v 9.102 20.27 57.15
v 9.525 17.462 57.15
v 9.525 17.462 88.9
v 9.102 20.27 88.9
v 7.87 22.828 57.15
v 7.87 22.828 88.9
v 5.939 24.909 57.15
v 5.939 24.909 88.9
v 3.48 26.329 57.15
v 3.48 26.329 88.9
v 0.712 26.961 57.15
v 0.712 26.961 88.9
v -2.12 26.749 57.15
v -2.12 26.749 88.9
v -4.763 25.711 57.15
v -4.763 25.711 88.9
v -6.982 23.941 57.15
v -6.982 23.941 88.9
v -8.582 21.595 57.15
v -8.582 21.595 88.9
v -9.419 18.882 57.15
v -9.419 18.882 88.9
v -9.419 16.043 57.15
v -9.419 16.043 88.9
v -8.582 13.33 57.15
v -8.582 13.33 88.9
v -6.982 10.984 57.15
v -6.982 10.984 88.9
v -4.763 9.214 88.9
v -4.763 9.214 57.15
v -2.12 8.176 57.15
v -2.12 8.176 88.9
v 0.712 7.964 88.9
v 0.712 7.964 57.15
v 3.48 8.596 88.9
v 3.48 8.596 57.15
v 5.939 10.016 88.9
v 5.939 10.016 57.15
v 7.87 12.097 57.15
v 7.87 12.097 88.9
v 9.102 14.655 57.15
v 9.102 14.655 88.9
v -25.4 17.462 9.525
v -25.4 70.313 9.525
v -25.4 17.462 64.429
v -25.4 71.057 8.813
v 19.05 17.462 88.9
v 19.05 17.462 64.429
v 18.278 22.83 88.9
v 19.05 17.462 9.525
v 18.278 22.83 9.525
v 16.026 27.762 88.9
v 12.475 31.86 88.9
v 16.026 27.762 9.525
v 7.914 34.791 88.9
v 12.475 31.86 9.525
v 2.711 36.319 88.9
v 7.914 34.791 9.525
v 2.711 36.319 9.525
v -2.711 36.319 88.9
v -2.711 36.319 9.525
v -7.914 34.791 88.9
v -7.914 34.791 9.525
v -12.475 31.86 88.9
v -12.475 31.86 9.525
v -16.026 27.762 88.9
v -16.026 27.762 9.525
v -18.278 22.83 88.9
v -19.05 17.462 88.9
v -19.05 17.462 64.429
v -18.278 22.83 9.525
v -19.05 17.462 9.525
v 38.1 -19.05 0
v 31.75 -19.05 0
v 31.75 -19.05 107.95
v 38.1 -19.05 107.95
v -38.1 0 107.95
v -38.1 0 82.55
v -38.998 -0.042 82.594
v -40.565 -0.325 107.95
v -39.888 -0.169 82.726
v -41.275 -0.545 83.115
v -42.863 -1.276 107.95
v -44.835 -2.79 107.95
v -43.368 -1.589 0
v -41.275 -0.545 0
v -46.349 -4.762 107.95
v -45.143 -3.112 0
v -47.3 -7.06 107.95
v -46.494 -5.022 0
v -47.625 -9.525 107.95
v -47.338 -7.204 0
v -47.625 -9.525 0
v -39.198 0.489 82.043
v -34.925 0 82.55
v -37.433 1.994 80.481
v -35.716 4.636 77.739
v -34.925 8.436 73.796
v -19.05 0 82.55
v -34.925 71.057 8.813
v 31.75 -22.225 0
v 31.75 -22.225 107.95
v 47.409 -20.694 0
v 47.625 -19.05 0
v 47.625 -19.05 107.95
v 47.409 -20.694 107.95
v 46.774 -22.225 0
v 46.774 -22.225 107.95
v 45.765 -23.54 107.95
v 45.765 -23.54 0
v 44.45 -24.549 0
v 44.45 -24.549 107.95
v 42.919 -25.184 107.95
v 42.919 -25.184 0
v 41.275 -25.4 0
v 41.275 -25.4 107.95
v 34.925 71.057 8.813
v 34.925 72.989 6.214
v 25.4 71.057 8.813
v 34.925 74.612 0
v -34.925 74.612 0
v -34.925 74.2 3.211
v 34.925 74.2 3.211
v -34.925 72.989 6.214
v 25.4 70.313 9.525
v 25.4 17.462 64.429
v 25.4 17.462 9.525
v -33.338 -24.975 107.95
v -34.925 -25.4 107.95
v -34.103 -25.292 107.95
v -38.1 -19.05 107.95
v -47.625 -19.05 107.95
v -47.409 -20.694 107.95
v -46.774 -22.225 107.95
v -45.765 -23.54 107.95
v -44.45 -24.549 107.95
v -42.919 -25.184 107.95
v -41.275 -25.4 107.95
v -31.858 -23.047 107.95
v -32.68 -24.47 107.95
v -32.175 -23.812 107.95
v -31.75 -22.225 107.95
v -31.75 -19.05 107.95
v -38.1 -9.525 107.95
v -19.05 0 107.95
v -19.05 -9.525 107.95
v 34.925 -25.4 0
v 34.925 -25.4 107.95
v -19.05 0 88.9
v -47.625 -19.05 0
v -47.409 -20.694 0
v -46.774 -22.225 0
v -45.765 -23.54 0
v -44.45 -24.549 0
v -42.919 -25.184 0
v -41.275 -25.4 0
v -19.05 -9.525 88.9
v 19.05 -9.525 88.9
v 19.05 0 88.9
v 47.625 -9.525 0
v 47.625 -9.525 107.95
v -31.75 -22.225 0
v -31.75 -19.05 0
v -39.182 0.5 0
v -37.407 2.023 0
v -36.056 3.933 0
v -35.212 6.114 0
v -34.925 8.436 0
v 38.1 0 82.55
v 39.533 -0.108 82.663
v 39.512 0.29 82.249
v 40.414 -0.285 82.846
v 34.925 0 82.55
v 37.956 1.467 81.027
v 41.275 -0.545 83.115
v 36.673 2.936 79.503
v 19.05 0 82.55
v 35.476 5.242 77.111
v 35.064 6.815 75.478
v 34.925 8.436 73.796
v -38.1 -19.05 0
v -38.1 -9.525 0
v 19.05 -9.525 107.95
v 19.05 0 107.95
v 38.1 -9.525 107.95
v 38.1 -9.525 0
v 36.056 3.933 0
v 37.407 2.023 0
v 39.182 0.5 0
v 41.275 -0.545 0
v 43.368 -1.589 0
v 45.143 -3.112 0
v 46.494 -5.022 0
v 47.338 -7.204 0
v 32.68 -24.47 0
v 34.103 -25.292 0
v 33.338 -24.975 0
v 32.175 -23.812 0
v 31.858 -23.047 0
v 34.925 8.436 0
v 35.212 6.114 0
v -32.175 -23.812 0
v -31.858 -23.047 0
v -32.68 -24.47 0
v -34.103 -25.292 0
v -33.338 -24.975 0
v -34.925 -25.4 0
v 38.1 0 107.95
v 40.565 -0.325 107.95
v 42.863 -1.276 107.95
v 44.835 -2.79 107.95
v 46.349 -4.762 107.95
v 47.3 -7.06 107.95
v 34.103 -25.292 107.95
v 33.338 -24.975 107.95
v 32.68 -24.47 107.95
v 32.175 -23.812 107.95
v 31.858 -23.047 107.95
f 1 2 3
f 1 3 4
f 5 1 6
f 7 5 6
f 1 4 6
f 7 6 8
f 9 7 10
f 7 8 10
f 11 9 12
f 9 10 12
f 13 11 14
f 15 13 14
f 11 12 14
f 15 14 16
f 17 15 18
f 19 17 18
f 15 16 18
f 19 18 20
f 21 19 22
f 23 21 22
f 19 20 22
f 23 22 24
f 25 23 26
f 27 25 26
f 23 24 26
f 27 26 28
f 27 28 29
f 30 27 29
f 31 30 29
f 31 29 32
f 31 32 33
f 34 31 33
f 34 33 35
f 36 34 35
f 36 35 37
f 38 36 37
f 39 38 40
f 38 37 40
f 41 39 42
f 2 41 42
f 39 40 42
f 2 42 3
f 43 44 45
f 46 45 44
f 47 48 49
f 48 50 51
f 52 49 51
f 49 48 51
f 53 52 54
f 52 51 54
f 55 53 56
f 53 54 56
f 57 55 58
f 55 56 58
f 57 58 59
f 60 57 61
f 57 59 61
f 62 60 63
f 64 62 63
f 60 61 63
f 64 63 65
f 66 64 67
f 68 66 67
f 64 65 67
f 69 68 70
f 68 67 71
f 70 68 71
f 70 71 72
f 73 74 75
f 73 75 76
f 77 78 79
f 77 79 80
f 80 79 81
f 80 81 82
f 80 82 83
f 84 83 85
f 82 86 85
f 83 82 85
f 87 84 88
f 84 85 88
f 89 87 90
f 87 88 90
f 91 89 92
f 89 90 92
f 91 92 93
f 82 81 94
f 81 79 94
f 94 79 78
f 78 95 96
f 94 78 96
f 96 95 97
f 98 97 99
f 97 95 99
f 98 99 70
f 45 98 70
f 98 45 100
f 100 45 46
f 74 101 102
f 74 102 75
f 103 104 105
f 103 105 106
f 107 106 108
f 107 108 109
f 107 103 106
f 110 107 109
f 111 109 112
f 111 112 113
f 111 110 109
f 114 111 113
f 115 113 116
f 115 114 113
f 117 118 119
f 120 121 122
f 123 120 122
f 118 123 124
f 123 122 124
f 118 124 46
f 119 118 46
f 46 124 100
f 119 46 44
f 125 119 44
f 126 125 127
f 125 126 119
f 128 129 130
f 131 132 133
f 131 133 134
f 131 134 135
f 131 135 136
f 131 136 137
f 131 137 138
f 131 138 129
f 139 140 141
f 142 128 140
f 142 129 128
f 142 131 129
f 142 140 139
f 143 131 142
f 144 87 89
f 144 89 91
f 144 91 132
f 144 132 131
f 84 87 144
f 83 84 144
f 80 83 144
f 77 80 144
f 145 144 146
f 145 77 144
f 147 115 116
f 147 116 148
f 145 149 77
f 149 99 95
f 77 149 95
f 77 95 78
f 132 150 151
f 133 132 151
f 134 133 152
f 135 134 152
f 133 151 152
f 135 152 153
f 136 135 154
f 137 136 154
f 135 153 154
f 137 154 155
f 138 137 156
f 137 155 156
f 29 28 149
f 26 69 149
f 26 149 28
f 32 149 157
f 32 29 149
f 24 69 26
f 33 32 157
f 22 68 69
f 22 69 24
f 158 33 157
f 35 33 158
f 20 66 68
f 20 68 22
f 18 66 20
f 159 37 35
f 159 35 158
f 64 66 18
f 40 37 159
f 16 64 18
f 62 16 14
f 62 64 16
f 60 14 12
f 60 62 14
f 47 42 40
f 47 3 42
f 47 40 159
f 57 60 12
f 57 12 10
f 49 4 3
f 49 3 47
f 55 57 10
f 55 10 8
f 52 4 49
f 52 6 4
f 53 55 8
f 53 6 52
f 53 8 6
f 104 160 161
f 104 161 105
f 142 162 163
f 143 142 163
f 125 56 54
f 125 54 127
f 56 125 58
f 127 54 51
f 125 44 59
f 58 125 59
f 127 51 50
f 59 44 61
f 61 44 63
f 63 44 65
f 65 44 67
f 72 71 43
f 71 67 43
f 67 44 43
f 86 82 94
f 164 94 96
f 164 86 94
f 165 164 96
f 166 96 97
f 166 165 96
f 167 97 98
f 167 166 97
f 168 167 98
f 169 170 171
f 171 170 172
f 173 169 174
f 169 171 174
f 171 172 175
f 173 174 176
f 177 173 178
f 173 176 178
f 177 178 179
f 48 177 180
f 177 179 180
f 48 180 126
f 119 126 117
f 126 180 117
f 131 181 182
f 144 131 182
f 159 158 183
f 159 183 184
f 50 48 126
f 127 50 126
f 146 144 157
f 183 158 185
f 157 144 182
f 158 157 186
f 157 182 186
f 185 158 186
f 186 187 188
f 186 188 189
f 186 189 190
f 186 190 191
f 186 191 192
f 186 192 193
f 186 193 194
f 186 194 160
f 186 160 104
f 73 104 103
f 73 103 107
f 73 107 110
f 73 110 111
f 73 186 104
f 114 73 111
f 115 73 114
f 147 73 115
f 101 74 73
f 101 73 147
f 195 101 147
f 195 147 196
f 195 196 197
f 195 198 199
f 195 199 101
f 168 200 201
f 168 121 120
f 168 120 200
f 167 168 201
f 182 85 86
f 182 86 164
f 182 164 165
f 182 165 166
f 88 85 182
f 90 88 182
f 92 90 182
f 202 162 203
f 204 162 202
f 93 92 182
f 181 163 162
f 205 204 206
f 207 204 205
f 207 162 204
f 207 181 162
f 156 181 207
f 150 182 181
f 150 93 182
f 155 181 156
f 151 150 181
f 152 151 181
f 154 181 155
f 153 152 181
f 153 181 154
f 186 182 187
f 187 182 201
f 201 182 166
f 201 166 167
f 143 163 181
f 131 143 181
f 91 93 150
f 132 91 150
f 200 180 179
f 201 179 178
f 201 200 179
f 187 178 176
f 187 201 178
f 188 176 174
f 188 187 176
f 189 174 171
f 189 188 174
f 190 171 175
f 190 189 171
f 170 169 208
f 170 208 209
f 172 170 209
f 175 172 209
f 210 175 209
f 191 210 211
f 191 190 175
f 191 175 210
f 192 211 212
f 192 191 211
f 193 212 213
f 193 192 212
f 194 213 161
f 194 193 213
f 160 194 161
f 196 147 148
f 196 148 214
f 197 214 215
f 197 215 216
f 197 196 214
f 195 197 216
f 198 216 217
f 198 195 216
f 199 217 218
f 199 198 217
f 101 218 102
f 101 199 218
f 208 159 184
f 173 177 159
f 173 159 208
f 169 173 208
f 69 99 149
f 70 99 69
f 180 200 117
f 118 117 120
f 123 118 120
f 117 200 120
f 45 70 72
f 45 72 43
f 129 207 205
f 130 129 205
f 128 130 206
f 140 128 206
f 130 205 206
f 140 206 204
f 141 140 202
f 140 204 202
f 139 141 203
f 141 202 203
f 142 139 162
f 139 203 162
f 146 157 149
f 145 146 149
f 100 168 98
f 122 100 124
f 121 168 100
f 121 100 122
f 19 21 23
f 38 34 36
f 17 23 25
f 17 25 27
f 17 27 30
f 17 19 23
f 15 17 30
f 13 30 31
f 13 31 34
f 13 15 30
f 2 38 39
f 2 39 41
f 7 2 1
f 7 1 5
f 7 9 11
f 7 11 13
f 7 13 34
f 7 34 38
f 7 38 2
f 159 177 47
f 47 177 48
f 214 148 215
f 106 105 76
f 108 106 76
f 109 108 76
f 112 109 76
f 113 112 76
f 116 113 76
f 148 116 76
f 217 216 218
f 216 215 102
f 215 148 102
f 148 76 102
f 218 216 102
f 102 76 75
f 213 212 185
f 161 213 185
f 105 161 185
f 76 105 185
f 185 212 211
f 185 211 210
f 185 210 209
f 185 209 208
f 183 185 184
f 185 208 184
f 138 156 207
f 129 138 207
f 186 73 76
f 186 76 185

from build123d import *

# Parameters (mm, degrees)
BOSS_EXTRUDE1_DEPTH   = 107.95
BOSS_EXTRUDE1_2_DEPTH = 107.95
SKETCH1_6_W           = 6.35
SKETCH1_6_H           = 17.4625
BOSS_EXTRUDE2_DEPTH   = 82.55
CUT_EXTRUDE2_REACH    = 157.031
BOSS_EXTRUDE4_DEPTH   = 88.9
BOSS_EXTRUDE6_REACH   = 152.176
SKETCH5_R             = 9.525
CUT_EXTRUDE3_DEPTH    = 31.75
FILLET2_R             = 9.525


with BuildPart() as part:
    # Sketch1 → Boss-Extrude1 (new body)
    with BuildSketch(Plane.XY):
        with BuildLine():
            ThreePointArc((34.925, -25.4), (32.67993597, -24.47006403), (31.75, -22.225))
            Line((31.75, -22.225), (31.75, -19.05))
            Line((31.75, -19.05), (38.1, -19.05))
            Line((38.1, -19.05), (38.1, -9.525))
            Line((38.1, -9.525), (19.05, -9.525))
            Line((19.05, -9.525), (19.05, 0))
            Line((19.05, 0), (38.1, 0))
            ThreePointArc((38.1, 0), (44.835192091, -2.789807909), (47.625, -9.525))
            Line((47.625, -9.525), (47.625, -19.05))
            ThreePointArc((47.625, -19.05), (45.765128061, -23.540128061), (41.275, -25.4))
            Line((41.275, -25.4), (34.925, -25.4))
        make_face()
    extrude(amount=BOSS_EXTRUDE1_DEPTH)

    # Sketch1<6> → Boss-Extrude2 (add)
    with BuildSketch(Plane.XY):
        with Locations((22.225, 8.73125)):
            Rectangle(SKETCH1_6_W, SKETCH1_6_H)
        Polygon((25.4, 17.4625), (25.4, 0), (34.925, 0), (34.925, 74.6125), (25.4, 74.6125), align=None)
    boss_extrude2 = extrude(amount=BOSS_EXTRUDE2_DEPTH)

    # Cut-Extrude2: up to this face of the body (flat: up to its plane)
    cut_extrude2_end = Plane(part.part.faces().sort_by_distance((19.05, 3.113443878, 46.562346939))[0])
    # Sketch3 → Cut-Extrude2 (cut, up to the picked face)
    with BuildSketch(Plane(origin=(34.925, 0, 0), x_dir=(0, 0, -1), z_dir=(1, 0, 0)), mode=Mode.PRIVATE) as cut_extrude2_sk1:
        with BuildLine():
            Line((-82.55, 0), (-8.812527697, 71.057408725))
            ThreePointArc((-8.812527697, 71.057408725), (-4.751297675, 73.690240462), (0, 74.6125))
            Line((0, 74.6125), (-82.55, 74.6125))
            Line((-82.55, 74.6125), (-82.55, 0))
        make_face()
    cut_extrude2_tool1 = split(extrude(cut_extrude2_sk1.sketch, amount=-CUT_EXTRUDE2_REACH, mode=Mode.PRIVATE), bisect_by=cut_extrude2_end, keep=Keep.BOTH, mode=Mode.PRIVATE)
    cut_extrude2 = cut_extrude2_tool1.solids().sort_by(Axis((34.925, 49.768554, 56.6833), (-1, 0, 0)))[0]
    add(cut_extrude2, mode=Mode.SUBTRACT)



with BuildPart() as body_2:
    # Sketch1 → Boss-Extrude1 2 (new body)
    with BuildSketch(Plane.XY):
        with BuildLine():
            Line((-38.1, -9.525), (-19.05, -9.525))
            Line((-19.05, -9.525), (-19.05, 0))
            Line((-19.05, 0), (-25.4, 0))
            Line((-25.4, 0), (-34.925, 0))
            Line((-34.925, 0), (-38.1, 0))
            ThreePointArc((-38.1, 0), (-44.835192091, -2.789807909), (-47.625, -9.525))
            Line((-47.625, -9.525), (-47.625, -19.05))
            ThreePointArc((-47.625, -19.05), (-45.765128061, -23.540128061), (-41.275, -25.4))
            Line((-41.275, -25.4), (-34.925, -25.4))
            ThreePointArc((-34.925, -25.4), (-32.67993597, -24.47006403), (-31.75, -22.225))
            Line((-31.75, -22.225), (-31.75, -19.05))
            Line((-31.75, -19.05), (-38.1, -19.05))
            Line((-38.1, -19.05), (-38.1, -9.525))
        make_face()
    extrude(amount=BOSS_EXTRUDE1_2_DEPTH)


with BuildPart() as part_1:
    add(part.part)

    add(body_2.part)  # Boss-Extrude4 merges body 2
    # Sketch1<8> → Boss-Extrude4 (add)
    with BuildSketch(Plane.XY):
        with BuildLine():
            Line((19.05, -9.525), (19.05, 0))
            Line((19.05, 0), (19.05, 17.4625))
            ThreePointArc((19.05, 17.4625), (0, 36.5125), (-19.05, 17.4625))
            Line((-19.05, 17.4625), (-19.05, 0))
            Line((-19.05, 0), (-19.05, -9.525))
            Line((-19.05, -9.525), (19.05, -9.525))
        make_face()
    extrude(amount=BOSS_EXTRUDE4_DEPTH)

    # Mirror1: Boss-Extrude2, Cut-Extrude2 across plane
    add(boss_extrude2.mirror(Plane(origin=(0, 0, 0), x_dir=(0, 0, 1), z_dir=(1, 0, 0))))
    add(cut_extrude2.mirror(Plane(origin=(0, 0, 0), x_dir=(0, 0, 1), z_dir=(1, 0, 0))), mode=Mode.SUBTRACT)

    # Boss-Extrude6: up to this face of the body (flat: up to its plane)
    boss_extrude6_end = Plane(part_1.part.faces().sort_by_distance((25.4, 37.857380573, 21.629312561))[0])
    # Sketch4 → Boss-Extrude6 (add, up to the picked face)
    with BuildSketch(Plane(origin=(-25.4, 0, 0), x_dir=(0, 0, -1), z_dir=(1, 0, 0)), mode=Mode.PRIVATE) as boss_extrude6_sk1:
        with BuildLine():
            Line((0, 17.4625), (0, 74.6125))
            ThreePointArc((0, 74.6125), (-4.751297675, 73.690240462), (-8.812527697, 71.057408725))
            Line((-8.812527697, 71.057408725), (-9.525, 70.312760413))
            Line((-9.525, 70.312760413), (-9.525, 17.4625))
            Line((-9.525, 17.4625), (0, 17.4625))
        make_face()
    boss_extrude6_tool1 = split(extrude(boss_extrude6_sk1.sketch, amount=BOSS_EXTRUDE6_REACH, mode=Mode.PRIVATE), bisect_by=boss_extrude6_end, keep=Keep.BOTH, mode=Mode.PRIVATE)
    add(boss_extrude6_tool1.solids().sort_by(Axis((-25.4, 45.391099, 4.704073), (1, 0, 0)))[0])

    # Sketch5 → Cut-Extrude3 (cut)
    with BuildSketch(Plane.XY.offset(88.9)):
        with Locations((0, 17.4625)):
            Circle(SKETCH5_R)
    extrude(amount=-CUT_EXTRUDE3_DEPTH, mode=Mode.SUBTRACT)

    # Fillet2
    # the kernel refuses this fillet: 9.525 mm, written as the material it adds along each edge
    with BuildSketch(Plane(origin=(-34.925, 0, 0), x_dir=(-0.9963405296085165, -0.08547250469841781, 0), z_dir=(0, 0, 1))) as fillet2_piece_1_section:
        with BuildLine():
            CenterArc((8.769139185, -9.218768342), FILLET2_R, 104.568024357, 70.528779366)
            Line((-0.72100436, -8.404642735), (-1.670018714, -8.323230174))
            Line((-1.670018714, -8.323230174), (-0.949014354, 0.081412561))
            Line((-0.949014354, 0.081412561), (0.081412561, 0.949014354))
            ThreePointArc((0.081412561, 0.949014354), (3.244793742, 0.677639152), (6.133741367, 0.921876834))
            Line((6.133741367, 0.921876834), (6.373322987, 0))
        make_face()
    fillet2_piece_1 = extrude(amount=103.638780605, mode=Mode.PRIVATE)
    fillet2_piece_1 = split(fillet2_piece_1, bisect_by=Plane(origin=(-36.202557182, 22.072398362, 59.645099694), z_dir=(0, -0.7200715531259144, -0.6938998186905898)), keep=Keep.TOP, mode=Mode.PRIVATE)
    add(fillet2_piece_1)
    with BuildSketch(Plane(origin=(34.925, 0, 0), x_dir=(0, 1, 0), z_dir=(0, 0, 1))) as fillet2_piece_2_section:
        with BuildLine():
            CenterArc((8.435512242, -9.525), FILLET2_R, 90, 70.528779366)
            Line((-0.544743879, -6.35), (-1.442769491, -6.0325))
            ThreePointArc((-1.442769491, -6.0325), (-0.9525, -3.175), (-0.9525, 0))
            Line((-0.9525, 0), (0, 0.9525))
            Line((0, 0.9525), (8.435512242, 0.9525))
            Line((8.435512242, 0.9525), (8.435512242, 0))
        make_face()
    fillet2_piece_2 = extrude(amount=103.638780605, mode=Mode.PRIVATE)
    fillet2_piece_2 = split(fillet2_piece_2, bisect_by=Plane(origin=(36.202557182, 22.072398362, 59.645099694), z_dir=(0, -0.7200715531259144, -0.6938998186905898)), keep=Keep.TOP, mode=Mode.PRIVATE)
    add(fillet2_piece_2)


solid = part_1.part
